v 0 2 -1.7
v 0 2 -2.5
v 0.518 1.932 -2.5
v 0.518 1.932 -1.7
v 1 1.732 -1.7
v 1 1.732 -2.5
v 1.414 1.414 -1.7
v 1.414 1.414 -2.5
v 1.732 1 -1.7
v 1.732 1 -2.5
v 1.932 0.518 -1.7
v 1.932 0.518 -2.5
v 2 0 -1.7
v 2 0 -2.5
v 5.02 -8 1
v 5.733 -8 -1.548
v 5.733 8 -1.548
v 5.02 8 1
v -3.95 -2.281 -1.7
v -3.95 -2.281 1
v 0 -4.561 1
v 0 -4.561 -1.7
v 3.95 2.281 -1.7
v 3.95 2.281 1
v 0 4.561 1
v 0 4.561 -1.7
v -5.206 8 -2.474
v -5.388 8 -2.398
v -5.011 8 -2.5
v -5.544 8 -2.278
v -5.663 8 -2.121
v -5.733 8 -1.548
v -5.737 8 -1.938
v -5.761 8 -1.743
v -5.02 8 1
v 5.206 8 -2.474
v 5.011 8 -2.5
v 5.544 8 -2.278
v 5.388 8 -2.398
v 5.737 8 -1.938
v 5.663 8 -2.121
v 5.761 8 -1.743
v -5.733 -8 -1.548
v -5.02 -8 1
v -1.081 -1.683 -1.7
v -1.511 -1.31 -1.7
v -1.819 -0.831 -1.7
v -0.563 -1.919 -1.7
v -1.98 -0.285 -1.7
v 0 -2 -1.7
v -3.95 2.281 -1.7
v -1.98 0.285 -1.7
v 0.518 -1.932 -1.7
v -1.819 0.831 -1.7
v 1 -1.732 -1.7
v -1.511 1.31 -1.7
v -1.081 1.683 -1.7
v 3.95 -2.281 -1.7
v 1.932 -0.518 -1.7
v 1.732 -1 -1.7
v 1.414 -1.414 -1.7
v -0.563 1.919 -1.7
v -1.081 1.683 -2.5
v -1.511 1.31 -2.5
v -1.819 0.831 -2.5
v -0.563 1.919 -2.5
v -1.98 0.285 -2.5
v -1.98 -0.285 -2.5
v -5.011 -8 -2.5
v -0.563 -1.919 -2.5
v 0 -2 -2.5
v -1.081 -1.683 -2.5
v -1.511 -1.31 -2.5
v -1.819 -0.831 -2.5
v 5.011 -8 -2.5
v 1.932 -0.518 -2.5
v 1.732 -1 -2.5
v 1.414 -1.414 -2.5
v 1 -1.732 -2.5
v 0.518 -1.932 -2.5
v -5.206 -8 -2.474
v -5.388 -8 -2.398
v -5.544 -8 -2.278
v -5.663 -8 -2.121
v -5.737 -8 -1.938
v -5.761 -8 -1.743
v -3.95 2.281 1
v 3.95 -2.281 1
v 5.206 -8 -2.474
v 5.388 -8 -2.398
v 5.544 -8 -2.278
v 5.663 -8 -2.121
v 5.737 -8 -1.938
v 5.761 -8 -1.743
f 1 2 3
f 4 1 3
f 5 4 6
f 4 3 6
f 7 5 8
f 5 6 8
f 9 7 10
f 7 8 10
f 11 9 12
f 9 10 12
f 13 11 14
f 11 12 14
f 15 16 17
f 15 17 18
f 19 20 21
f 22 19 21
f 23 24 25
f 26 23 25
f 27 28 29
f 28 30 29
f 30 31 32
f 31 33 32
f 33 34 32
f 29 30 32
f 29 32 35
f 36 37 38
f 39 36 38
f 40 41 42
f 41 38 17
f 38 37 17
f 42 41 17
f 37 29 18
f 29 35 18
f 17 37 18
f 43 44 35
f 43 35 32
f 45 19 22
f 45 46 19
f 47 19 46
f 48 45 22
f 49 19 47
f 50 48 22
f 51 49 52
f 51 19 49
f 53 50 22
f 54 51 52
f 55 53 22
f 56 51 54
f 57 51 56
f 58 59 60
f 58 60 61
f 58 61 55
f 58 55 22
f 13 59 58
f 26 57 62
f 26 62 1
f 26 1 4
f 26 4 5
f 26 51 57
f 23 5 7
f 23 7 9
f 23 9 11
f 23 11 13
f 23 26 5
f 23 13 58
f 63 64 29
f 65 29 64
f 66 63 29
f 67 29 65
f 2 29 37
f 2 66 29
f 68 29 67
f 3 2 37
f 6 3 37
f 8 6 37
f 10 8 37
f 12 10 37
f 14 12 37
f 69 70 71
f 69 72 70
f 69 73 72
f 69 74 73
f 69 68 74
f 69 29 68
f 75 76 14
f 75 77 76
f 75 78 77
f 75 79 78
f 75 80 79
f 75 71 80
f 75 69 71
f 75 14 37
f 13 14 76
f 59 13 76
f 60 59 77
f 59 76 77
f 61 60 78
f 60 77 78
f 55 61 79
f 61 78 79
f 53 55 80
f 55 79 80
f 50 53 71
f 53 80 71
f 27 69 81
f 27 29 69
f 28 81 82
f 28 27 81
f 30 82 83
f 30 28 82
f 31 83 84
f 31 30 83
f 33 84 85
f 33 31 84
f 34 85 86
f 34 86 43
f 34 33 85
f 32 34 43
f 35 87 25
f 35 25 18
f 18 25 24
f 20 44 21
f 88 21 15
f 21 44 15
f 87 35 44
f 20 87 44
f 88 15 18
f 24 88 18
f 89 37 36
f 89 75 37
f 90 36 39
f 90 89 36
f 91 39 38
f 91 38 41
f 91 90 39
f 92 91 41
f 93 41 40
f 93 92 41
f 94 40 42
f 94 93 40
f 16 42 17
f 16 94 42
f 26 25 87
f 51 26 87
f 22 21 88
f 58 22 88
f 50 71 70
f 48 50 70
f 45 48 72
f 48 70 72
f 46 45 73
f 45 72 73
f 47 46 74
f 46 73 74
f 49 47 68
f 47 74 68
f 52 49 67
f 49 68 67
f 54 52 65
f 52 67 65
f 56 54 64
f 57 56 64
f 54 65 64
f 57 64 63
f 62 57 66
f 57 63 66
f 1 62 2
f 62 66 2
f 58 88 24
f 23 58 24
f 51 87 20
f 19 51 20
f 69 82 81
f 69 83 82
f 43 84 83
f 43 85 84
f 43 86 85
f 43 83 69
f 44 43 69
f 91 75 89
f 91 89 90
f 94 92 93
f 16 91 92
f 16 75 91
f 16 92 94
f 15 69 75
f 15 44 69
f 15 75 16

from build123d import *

# Parameters (mm, degrees)
F0_W     = 9.2
F0_H     = 5
F1_DEPTH = 8
F3_R     = 0.75
F6_DEPTH = 30
F7_DEPTH = 4.2
F8_DEPTH = 25


with BuildPart() as f1:
    # F0 (on Front) → F1 (new body, symmetric)
    with BuildSketch(Plane.XZ):
        Polygon((-6, -2.5), (-4.6, -2.5), (-4.6, 2.5), align=None)
        Rectangle(F0_W, F0_H)
        Polygon((4.6, -2.5), (6, -2.5), (4.6, 2.5), align=None)
    extrude(amount=F1_DEPTH, both=True)

    # F3
    f3_edges = [f1.edges().sort_by_distance(p)[0] for p in [
        (-4.6, 0, 2.5),
        (4.6, 0, 2.5),
        (6, 0, -2.5),
        (-6, 0, -2.5),
    ]]
    fillet(f3_edges, radius=F3_R)

    # F5 (on face) → F6 (cut)
    with BuildSketch(Plane.XZ.offset(8)):
        with BuildLine():
            Line((7.368007, 1), (7.368007, 4))
            Line((7.368007, 4), (-7.368007, 4))
            Line((-7.368007, 4), (-7.368007, 1))
            Line((-7.368007, 1), (-5.02, 1))
            Line((-5.02, 1), (-4.753378, 1.952222))
            ThreePointArc((-4.753378, 1.952222), (-4.484384, 2.347565), (-4.031155, 2.5))
            Line((-4.031155, 2.5), (4.031155, 2.5))
            ThreePointArc((4.031155, 2.5), (4.484384, 2.347565), (4.753378, 1.952222))
            Line((4.753378, 1.952222), (5.02, 1))
            Line((5.02, 1), (7.368007, 1))
        make_face()
        with BuildLine():
            Line((-5.02, 1), (5.02, 1))
            Line((5.02, 1), (4.753378, 1.952222))
            ThreePointArc((4.753378, 1.952222), (4.484384, 2.347565), (4.031155, 2.5))
            Line((4.031155, 2.5), (-4.031155, 2.5))
            ThreePointArc((-4.031155, 2.5), (-4.484384, 2.347565), (-4.753378, 1.952222))
            Line((-4.753378, 1.952222), (-5.02, 1))
        make_face()
    extrude(amount=-F6_DEPTH, mode=Mode.SUBTRACT)

    # F4 (on face) → F7 (cut)
    with BuildSketch(Plane.XY.offset(2.5)):
        Polygon((3.95, -2.280534), (3.95, 2.280534), (0, 4.561067), (-3.95, 2.280534), (-3.95, -2.280534), (0, -4.561067), align=None)
    extrude(amount=-F7_DEPTH, mode=Mode.SUBTRACT)

    # F2 (on face) → F8 (cut)
    with BuildSketch(Plane(origin=(0, 0, -2.5), x_dir=(1, 0, 0), z_dir=(0, 0, -1))):
        with BuildLine():
            Line((0, -2), (0, 0))
            Line((0, 0), (0, 2))
            ThreePointArc((0, 2), (-2, 0), (0, -2))
        make_face()
        with BuildLine():
            Line((0, 2), (0, 0))
            Line((0, 0), (0, -2))
            ThreePointArc((0, -2), (1.414214, -1.414214), (2, 0))
            ThreePointArc((2, 0), (1.414214, 1.414214), (0, 2))
        make_face()
    extrude(amount=-F8_DEPTH, mode=Mode.SUBTRACT)


solid = f1.part
